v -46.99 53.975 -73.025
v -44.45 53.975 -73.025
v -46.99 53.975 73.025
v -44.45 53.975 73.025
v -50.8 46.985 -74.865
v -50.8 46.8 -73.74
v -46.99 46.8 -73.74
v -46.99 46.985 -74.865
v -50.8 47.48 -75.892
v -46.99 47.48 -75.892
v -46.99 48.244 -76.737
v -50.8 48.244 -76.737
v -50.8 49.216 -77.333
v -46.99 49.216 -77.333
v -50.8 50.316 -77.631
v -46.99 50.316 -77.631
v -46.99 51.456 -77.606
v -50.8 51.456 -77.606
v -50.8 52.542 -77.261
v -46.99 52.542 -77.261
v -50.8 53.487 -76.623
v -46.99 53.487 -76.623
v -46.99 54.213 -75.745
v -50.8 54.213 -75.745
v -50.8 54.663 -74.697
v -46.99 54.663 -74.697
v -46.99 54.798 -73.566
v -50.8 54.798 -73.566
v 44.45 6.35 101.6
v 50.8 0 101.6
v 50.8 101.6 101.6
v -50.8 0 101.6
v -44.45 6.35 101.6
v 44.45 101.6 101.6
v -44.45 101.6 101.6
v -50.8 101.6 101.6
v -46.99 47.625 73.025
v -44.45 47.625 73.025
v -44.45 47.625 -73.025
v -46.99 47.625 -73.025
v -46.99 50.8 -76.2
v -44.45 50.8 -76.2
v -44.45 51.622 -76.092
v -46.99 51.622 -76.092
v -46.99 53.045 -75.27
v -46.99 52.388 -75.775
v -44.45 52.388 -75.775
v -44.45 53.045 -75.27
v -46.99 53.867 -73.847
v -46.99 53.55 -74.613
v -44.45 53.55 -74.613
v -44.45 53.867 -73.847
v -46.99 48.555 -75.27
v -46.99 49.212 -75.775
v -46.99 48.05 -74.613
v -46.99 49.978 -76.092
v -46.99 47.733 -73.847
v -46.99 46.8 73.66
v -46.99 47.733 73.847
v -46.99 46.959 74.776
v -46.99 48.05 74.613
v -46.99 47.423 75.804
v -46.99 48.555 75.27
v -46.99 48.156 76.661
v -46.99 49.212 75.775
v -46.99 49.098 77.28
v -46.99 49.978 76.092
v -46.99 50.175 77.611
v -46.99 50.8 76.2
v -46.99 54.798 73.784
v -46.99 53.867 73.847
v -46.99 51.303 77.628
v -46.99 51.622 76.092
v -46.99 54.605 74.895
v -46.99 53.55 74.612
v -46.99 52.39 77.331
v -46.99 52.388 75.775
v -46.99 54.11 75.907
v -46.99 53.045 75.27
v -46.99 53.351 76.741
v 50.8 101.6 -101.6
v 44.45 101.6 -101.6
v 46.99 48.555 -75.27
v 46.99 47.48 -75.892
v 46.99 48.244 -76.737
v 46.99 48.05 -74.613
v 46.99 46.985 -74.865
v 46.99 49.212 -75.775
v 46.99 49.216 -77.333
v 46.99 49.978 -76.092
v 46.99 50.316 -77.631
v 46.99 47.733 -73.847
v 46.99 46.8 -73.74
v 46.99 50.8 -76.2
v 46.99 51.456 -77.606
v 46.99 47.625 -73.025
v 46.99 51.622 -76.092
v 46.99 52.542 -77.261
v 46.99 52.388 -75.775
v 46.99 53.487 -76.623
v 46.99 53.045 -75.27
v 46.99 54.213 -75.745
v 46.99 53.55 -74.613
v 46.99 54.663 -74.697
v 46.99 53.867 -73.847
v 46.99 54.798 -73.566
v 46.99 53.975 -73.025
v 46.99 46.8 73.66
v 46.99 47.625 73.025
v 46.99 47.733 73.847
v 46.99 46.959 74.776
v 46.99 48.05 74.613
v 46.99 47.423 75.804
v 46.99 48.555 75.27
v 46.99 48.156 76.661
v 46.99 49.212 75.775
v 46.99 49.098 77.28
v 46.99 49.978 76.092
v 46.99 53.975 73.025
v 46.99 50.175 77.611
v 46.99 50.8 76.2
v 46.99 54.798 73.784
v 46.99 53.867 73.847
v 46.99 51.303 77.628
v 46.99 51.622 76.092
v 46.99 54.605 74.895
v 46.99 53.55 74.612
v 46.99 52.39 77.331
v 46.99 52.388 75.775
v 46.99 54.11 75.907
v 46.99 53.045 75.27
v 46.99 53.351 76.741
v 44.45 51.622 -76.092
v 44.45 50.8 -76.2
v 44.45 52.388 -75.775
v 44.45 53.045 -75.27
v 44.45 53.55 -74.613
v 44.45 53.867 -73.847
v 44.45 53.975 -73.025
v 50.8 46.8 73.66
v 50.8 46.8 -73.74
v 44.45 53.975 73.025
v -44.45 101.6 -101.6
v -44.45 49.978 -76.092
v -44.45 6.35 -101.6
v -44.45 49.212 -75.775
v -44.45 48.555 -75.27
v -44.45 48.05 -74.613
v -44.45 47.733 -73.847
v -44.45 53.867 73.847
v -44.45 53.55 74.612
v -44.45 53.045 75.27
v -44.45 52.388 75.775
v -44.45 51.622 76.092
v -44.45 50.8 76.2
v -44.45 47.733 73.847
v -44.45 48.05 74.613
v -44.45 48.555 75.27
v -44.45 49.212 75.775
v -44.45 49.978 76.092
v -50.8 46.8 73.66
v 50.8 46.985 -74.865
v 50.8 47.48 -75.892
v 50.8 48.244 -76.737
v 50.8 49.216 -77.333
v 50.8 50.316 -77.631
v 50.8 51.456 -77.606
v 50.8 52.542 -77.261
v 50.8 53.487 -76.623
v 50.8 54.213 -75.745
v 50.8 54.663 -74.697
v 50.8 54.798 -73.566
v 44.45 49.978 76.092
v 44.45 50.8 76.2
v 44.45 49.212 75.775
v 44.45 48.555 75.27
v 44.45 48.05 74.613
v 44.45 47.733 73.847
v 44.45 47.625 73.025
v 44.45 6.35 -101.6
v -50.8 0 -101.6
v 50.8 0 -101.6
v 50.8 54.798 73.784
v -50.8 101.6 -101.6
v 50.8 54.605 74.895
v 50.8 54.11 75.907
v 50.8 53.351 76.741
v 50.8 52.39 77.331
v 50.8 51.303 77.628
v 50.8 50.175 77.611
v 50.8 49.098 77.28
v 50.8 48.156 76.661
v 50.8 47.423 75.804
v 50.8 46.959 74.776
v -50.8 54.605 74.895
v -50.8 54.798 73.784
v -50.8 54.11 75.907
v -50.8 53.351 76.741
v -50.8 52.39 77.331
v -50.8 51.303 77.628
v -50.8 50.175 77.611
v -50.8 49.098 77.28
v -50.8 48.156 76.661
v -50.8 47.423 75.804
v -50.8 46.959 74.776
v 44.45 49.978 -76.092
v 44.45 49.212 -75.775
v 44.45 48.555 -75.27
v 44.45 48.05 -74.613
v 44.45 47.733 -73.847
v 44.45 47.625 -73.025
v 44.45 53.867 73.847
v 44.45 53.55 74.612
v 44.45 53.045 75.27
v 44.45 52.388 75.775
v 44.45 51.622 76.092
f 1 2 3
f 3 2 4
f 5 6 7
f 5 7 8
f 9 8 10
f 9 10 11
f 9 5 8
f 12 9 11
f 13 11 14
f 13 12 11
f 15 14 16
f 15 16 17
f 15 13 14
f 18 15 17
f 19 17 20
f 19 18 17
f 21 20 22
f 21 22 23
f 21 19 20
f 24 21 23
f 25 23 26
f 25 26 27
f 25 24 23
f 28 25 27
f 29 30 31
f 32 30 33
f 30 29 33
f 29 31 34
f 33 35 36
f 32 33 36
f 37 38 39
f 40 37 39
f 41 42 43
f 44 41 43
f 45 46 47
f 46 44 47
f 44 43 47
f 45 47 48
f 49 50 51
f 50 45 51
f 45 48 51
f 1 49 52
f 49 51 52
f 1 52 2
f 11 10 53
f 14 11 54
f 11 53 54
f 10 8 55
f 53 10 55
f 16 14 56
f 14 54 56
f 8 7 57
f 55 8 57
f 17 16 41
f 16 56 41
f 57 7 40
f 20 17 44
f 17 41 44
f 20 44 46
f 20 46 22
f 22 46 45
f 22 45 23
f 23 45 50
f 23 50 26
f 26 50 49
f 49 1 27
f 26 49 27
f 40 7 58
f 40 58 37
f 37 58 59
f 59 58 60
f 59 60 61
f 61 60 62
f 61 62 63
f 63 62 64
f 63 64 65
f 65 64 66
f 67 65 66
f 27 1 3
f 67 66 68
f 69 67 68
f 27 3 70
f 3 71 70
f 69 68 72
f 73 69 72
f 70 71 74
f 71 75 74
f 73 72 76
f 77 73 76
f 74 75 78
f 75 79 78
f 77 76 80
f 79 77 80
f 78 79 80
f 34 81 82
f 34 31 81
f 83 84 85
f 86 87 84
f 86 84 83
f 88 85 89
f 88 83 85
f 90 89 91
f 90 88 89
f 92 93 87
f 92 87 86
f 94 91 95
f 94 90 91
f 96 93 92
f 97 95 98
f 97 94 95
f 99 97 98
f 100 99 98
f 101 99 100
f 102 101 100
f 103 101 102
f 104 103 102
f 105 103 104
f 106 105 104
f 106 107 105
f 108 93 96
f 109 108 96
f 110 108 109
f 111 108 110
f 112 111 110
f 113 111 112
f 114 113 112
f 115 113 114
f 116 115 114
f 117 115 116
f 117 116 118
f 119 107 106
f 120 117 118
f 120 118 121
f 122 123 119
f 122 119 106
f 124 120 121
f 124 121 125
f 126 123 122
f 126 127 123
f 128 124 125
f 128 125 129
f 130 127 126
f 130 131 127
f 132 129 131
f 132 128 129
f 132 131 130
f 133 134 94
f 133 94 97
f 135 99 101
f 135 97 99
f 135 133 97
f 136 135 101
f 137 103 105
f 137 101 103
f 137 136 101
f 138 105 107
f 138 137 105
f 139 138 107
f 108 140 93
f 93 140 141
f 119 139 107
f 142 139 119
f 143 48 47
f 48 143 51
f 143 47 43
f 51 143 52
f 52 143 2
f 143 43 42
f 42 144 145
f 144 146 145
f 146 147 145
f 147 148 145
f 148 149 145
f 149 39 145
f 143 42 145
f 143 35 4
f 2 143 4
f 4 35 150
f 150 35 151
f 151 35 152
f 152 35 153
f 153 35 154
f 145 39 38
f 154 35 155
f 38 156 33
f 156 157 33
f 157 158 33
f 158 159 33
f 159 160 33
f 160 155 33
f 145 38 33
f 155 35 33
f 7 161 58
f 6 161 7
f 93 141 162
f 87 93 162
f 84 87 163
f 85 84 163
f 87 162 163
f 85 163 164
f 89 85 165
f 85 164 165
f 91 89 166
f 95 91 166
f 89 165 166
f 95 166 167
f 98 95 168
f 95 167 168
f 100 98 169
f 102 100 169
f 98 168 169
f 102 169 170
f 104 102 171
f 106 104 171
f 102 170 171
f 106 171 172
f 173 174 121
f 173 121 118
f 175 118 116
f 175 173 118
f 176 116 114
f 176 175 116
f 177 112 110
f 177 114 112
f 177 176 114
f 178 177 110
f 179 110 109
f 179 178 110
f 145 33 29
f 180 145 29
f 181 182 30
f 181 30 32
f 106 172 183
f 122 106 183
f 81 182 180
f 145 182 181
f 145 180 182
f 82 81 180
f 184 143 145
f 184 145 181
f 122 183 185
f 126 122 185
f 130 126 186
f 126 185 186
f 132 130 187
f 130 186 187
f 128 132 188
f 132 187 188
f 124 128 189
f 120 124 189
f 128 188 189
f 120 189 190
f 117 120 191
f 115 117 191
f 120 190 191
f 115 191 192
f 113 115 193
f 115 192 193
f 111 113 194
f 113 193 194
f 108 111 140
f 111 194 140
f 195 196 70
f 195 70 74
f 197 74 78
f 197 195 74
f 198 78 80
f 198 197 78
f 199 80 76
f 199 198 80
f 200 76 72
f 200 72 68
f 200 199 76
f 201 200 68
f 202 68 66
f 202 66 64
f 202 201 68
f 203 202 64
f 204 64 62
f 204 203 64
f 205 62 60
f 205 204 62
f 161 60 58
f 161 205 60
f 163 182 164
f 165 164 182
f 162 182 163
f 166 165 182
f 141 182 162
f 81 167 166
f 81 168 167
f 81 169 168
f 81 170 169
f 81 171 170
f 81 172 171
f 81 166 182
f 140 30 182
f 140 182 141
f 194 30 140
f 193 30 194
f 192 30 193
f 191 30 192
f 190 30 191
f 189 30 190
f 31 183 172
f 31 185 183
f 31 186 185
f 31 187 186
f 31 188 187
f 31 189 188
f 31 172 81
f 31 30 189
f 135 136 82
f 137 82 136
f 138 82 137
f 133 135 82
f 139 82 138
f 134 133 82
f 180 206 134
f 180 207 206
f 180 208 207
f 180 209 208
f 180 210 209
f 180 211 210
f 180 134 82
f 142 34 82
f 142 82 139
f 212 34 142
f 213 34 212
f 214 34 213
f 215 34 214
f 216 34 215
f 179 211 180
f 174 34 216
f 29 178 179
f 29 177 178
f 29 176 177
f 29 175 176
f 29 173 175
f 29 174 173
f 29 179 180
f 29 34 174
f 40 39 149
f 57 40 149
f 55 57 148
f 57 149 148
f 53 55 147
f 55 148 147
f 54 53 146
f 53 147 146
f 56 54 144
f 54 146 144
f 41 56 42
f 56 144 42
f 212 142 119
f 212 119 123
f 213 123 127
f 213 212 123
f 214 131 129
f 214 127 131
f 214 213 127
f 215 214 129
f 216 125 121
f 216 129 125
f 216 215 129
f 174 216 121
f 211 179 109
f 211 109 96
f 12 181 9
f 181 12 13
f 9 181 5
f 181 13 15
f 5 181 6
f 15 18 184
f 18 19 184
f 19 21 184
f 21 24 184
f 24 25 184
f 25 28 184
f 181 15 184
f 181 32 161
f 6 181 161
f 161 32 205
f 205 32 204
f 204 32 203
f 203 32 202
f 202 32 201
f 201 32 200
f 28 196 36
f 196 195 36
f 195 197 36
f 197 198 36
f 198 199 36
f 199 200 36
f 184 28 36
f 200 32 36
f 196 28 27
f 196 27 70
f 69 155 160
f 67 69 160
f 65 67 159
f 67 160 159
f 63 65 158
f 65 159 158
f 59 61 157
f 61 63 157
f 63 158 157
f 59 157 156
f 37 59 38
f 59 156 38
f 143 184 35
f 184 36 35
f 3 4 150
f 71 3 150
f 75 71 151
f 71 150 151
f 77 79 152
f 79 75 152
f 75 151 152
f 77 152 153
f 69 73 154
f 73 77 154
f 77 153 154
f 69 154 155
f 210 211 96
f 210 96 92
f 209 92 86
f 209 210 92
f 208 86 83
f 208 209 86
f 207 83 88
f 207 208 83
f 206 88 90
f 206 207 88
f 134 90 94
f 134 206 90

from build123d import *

# Parameters (mm, degrees)
F1_DEPTH      = 101.6
F3_DEPTH      = 287
F3_DEPTH_BACK = 50.801
F5_DEPTH      = 3.81


# Not quite as in the source:
# - an extrude ends at something that could not be found from the text; its depth is read off the source's solid


with BuildPart() as f1:
    # F0 (on Top) → F1 (new body, symmetric)
    with BuildSketch(Plane.XY):
        Polygon((44.45, 101.6), (44.45, 6.35), (0, 6.35), (0, 0), (50.8, 0), (50.8, 101.6), align=None)
    extrude(amount=F1_DEPTH, both=True)

    # F2 (on Right) → F3 (cut, two sides)
    with BuildSketch(Plane.YZ) as f3_sk:
        with BuildLine():
            ThreePointArc((47.625, -73.025), (48.5549359697, -75.2700640303), (50.8, -76.2))
            ThreePointArc((50.8, -76.2), (53.0450640303, -75.2700640303), (53.975, -73.025))
            Line((53.975, -73.025), (53.975, 73.0249999165))
            ThreePointArc((53.975, 73.0249999165), (53.0450640598, 75.2700640008), (50.8, 76.2))
            ThreePointArc((50.8, 76.2), (48.5549359697, 75.2700640303), (47.625, 73.025))
            Line((47.625, 73.025), (47.625, -73.025))
        make_face()
    extrude(amount=-F3_DEPTH, mode=Mode.SUBTRACT)
    extrude(f3_sk.sketch, amount=F3_DEPTH_BACK, mode=Mode.SUBTRACT)

    # F4 (on face) → F5 (cut)
    with BuildSketch(Plane.YZ.offset(50.8)):
        with BuildLine():
            Line((54.7984857559, -73.5657372472), (54.7984857559, 73.7838448219))
            ThreePointArc((54.7984857559, 73.7838448219), (50.7384735742, 77.6595205582), (46.8004034081, 73.66))
            Line((46.8004034081, 73.66), (46.8004034081, -73.740335956))
            ThreePointArc((46.8004034081, -73.740335956), (50.8868960802, -77.6590472365), (54.7984857559, -73.5657372472))
        make_face()
    extrude(amount=-F5_DEPTH, mode=Mode.SUBTRACT)

    # F6: F1 across plane


with BuildPart() as f1_1:
    add(f1.part)
    add(f1.part.mirror(Plane.YZ))


solid = f1_1.part
